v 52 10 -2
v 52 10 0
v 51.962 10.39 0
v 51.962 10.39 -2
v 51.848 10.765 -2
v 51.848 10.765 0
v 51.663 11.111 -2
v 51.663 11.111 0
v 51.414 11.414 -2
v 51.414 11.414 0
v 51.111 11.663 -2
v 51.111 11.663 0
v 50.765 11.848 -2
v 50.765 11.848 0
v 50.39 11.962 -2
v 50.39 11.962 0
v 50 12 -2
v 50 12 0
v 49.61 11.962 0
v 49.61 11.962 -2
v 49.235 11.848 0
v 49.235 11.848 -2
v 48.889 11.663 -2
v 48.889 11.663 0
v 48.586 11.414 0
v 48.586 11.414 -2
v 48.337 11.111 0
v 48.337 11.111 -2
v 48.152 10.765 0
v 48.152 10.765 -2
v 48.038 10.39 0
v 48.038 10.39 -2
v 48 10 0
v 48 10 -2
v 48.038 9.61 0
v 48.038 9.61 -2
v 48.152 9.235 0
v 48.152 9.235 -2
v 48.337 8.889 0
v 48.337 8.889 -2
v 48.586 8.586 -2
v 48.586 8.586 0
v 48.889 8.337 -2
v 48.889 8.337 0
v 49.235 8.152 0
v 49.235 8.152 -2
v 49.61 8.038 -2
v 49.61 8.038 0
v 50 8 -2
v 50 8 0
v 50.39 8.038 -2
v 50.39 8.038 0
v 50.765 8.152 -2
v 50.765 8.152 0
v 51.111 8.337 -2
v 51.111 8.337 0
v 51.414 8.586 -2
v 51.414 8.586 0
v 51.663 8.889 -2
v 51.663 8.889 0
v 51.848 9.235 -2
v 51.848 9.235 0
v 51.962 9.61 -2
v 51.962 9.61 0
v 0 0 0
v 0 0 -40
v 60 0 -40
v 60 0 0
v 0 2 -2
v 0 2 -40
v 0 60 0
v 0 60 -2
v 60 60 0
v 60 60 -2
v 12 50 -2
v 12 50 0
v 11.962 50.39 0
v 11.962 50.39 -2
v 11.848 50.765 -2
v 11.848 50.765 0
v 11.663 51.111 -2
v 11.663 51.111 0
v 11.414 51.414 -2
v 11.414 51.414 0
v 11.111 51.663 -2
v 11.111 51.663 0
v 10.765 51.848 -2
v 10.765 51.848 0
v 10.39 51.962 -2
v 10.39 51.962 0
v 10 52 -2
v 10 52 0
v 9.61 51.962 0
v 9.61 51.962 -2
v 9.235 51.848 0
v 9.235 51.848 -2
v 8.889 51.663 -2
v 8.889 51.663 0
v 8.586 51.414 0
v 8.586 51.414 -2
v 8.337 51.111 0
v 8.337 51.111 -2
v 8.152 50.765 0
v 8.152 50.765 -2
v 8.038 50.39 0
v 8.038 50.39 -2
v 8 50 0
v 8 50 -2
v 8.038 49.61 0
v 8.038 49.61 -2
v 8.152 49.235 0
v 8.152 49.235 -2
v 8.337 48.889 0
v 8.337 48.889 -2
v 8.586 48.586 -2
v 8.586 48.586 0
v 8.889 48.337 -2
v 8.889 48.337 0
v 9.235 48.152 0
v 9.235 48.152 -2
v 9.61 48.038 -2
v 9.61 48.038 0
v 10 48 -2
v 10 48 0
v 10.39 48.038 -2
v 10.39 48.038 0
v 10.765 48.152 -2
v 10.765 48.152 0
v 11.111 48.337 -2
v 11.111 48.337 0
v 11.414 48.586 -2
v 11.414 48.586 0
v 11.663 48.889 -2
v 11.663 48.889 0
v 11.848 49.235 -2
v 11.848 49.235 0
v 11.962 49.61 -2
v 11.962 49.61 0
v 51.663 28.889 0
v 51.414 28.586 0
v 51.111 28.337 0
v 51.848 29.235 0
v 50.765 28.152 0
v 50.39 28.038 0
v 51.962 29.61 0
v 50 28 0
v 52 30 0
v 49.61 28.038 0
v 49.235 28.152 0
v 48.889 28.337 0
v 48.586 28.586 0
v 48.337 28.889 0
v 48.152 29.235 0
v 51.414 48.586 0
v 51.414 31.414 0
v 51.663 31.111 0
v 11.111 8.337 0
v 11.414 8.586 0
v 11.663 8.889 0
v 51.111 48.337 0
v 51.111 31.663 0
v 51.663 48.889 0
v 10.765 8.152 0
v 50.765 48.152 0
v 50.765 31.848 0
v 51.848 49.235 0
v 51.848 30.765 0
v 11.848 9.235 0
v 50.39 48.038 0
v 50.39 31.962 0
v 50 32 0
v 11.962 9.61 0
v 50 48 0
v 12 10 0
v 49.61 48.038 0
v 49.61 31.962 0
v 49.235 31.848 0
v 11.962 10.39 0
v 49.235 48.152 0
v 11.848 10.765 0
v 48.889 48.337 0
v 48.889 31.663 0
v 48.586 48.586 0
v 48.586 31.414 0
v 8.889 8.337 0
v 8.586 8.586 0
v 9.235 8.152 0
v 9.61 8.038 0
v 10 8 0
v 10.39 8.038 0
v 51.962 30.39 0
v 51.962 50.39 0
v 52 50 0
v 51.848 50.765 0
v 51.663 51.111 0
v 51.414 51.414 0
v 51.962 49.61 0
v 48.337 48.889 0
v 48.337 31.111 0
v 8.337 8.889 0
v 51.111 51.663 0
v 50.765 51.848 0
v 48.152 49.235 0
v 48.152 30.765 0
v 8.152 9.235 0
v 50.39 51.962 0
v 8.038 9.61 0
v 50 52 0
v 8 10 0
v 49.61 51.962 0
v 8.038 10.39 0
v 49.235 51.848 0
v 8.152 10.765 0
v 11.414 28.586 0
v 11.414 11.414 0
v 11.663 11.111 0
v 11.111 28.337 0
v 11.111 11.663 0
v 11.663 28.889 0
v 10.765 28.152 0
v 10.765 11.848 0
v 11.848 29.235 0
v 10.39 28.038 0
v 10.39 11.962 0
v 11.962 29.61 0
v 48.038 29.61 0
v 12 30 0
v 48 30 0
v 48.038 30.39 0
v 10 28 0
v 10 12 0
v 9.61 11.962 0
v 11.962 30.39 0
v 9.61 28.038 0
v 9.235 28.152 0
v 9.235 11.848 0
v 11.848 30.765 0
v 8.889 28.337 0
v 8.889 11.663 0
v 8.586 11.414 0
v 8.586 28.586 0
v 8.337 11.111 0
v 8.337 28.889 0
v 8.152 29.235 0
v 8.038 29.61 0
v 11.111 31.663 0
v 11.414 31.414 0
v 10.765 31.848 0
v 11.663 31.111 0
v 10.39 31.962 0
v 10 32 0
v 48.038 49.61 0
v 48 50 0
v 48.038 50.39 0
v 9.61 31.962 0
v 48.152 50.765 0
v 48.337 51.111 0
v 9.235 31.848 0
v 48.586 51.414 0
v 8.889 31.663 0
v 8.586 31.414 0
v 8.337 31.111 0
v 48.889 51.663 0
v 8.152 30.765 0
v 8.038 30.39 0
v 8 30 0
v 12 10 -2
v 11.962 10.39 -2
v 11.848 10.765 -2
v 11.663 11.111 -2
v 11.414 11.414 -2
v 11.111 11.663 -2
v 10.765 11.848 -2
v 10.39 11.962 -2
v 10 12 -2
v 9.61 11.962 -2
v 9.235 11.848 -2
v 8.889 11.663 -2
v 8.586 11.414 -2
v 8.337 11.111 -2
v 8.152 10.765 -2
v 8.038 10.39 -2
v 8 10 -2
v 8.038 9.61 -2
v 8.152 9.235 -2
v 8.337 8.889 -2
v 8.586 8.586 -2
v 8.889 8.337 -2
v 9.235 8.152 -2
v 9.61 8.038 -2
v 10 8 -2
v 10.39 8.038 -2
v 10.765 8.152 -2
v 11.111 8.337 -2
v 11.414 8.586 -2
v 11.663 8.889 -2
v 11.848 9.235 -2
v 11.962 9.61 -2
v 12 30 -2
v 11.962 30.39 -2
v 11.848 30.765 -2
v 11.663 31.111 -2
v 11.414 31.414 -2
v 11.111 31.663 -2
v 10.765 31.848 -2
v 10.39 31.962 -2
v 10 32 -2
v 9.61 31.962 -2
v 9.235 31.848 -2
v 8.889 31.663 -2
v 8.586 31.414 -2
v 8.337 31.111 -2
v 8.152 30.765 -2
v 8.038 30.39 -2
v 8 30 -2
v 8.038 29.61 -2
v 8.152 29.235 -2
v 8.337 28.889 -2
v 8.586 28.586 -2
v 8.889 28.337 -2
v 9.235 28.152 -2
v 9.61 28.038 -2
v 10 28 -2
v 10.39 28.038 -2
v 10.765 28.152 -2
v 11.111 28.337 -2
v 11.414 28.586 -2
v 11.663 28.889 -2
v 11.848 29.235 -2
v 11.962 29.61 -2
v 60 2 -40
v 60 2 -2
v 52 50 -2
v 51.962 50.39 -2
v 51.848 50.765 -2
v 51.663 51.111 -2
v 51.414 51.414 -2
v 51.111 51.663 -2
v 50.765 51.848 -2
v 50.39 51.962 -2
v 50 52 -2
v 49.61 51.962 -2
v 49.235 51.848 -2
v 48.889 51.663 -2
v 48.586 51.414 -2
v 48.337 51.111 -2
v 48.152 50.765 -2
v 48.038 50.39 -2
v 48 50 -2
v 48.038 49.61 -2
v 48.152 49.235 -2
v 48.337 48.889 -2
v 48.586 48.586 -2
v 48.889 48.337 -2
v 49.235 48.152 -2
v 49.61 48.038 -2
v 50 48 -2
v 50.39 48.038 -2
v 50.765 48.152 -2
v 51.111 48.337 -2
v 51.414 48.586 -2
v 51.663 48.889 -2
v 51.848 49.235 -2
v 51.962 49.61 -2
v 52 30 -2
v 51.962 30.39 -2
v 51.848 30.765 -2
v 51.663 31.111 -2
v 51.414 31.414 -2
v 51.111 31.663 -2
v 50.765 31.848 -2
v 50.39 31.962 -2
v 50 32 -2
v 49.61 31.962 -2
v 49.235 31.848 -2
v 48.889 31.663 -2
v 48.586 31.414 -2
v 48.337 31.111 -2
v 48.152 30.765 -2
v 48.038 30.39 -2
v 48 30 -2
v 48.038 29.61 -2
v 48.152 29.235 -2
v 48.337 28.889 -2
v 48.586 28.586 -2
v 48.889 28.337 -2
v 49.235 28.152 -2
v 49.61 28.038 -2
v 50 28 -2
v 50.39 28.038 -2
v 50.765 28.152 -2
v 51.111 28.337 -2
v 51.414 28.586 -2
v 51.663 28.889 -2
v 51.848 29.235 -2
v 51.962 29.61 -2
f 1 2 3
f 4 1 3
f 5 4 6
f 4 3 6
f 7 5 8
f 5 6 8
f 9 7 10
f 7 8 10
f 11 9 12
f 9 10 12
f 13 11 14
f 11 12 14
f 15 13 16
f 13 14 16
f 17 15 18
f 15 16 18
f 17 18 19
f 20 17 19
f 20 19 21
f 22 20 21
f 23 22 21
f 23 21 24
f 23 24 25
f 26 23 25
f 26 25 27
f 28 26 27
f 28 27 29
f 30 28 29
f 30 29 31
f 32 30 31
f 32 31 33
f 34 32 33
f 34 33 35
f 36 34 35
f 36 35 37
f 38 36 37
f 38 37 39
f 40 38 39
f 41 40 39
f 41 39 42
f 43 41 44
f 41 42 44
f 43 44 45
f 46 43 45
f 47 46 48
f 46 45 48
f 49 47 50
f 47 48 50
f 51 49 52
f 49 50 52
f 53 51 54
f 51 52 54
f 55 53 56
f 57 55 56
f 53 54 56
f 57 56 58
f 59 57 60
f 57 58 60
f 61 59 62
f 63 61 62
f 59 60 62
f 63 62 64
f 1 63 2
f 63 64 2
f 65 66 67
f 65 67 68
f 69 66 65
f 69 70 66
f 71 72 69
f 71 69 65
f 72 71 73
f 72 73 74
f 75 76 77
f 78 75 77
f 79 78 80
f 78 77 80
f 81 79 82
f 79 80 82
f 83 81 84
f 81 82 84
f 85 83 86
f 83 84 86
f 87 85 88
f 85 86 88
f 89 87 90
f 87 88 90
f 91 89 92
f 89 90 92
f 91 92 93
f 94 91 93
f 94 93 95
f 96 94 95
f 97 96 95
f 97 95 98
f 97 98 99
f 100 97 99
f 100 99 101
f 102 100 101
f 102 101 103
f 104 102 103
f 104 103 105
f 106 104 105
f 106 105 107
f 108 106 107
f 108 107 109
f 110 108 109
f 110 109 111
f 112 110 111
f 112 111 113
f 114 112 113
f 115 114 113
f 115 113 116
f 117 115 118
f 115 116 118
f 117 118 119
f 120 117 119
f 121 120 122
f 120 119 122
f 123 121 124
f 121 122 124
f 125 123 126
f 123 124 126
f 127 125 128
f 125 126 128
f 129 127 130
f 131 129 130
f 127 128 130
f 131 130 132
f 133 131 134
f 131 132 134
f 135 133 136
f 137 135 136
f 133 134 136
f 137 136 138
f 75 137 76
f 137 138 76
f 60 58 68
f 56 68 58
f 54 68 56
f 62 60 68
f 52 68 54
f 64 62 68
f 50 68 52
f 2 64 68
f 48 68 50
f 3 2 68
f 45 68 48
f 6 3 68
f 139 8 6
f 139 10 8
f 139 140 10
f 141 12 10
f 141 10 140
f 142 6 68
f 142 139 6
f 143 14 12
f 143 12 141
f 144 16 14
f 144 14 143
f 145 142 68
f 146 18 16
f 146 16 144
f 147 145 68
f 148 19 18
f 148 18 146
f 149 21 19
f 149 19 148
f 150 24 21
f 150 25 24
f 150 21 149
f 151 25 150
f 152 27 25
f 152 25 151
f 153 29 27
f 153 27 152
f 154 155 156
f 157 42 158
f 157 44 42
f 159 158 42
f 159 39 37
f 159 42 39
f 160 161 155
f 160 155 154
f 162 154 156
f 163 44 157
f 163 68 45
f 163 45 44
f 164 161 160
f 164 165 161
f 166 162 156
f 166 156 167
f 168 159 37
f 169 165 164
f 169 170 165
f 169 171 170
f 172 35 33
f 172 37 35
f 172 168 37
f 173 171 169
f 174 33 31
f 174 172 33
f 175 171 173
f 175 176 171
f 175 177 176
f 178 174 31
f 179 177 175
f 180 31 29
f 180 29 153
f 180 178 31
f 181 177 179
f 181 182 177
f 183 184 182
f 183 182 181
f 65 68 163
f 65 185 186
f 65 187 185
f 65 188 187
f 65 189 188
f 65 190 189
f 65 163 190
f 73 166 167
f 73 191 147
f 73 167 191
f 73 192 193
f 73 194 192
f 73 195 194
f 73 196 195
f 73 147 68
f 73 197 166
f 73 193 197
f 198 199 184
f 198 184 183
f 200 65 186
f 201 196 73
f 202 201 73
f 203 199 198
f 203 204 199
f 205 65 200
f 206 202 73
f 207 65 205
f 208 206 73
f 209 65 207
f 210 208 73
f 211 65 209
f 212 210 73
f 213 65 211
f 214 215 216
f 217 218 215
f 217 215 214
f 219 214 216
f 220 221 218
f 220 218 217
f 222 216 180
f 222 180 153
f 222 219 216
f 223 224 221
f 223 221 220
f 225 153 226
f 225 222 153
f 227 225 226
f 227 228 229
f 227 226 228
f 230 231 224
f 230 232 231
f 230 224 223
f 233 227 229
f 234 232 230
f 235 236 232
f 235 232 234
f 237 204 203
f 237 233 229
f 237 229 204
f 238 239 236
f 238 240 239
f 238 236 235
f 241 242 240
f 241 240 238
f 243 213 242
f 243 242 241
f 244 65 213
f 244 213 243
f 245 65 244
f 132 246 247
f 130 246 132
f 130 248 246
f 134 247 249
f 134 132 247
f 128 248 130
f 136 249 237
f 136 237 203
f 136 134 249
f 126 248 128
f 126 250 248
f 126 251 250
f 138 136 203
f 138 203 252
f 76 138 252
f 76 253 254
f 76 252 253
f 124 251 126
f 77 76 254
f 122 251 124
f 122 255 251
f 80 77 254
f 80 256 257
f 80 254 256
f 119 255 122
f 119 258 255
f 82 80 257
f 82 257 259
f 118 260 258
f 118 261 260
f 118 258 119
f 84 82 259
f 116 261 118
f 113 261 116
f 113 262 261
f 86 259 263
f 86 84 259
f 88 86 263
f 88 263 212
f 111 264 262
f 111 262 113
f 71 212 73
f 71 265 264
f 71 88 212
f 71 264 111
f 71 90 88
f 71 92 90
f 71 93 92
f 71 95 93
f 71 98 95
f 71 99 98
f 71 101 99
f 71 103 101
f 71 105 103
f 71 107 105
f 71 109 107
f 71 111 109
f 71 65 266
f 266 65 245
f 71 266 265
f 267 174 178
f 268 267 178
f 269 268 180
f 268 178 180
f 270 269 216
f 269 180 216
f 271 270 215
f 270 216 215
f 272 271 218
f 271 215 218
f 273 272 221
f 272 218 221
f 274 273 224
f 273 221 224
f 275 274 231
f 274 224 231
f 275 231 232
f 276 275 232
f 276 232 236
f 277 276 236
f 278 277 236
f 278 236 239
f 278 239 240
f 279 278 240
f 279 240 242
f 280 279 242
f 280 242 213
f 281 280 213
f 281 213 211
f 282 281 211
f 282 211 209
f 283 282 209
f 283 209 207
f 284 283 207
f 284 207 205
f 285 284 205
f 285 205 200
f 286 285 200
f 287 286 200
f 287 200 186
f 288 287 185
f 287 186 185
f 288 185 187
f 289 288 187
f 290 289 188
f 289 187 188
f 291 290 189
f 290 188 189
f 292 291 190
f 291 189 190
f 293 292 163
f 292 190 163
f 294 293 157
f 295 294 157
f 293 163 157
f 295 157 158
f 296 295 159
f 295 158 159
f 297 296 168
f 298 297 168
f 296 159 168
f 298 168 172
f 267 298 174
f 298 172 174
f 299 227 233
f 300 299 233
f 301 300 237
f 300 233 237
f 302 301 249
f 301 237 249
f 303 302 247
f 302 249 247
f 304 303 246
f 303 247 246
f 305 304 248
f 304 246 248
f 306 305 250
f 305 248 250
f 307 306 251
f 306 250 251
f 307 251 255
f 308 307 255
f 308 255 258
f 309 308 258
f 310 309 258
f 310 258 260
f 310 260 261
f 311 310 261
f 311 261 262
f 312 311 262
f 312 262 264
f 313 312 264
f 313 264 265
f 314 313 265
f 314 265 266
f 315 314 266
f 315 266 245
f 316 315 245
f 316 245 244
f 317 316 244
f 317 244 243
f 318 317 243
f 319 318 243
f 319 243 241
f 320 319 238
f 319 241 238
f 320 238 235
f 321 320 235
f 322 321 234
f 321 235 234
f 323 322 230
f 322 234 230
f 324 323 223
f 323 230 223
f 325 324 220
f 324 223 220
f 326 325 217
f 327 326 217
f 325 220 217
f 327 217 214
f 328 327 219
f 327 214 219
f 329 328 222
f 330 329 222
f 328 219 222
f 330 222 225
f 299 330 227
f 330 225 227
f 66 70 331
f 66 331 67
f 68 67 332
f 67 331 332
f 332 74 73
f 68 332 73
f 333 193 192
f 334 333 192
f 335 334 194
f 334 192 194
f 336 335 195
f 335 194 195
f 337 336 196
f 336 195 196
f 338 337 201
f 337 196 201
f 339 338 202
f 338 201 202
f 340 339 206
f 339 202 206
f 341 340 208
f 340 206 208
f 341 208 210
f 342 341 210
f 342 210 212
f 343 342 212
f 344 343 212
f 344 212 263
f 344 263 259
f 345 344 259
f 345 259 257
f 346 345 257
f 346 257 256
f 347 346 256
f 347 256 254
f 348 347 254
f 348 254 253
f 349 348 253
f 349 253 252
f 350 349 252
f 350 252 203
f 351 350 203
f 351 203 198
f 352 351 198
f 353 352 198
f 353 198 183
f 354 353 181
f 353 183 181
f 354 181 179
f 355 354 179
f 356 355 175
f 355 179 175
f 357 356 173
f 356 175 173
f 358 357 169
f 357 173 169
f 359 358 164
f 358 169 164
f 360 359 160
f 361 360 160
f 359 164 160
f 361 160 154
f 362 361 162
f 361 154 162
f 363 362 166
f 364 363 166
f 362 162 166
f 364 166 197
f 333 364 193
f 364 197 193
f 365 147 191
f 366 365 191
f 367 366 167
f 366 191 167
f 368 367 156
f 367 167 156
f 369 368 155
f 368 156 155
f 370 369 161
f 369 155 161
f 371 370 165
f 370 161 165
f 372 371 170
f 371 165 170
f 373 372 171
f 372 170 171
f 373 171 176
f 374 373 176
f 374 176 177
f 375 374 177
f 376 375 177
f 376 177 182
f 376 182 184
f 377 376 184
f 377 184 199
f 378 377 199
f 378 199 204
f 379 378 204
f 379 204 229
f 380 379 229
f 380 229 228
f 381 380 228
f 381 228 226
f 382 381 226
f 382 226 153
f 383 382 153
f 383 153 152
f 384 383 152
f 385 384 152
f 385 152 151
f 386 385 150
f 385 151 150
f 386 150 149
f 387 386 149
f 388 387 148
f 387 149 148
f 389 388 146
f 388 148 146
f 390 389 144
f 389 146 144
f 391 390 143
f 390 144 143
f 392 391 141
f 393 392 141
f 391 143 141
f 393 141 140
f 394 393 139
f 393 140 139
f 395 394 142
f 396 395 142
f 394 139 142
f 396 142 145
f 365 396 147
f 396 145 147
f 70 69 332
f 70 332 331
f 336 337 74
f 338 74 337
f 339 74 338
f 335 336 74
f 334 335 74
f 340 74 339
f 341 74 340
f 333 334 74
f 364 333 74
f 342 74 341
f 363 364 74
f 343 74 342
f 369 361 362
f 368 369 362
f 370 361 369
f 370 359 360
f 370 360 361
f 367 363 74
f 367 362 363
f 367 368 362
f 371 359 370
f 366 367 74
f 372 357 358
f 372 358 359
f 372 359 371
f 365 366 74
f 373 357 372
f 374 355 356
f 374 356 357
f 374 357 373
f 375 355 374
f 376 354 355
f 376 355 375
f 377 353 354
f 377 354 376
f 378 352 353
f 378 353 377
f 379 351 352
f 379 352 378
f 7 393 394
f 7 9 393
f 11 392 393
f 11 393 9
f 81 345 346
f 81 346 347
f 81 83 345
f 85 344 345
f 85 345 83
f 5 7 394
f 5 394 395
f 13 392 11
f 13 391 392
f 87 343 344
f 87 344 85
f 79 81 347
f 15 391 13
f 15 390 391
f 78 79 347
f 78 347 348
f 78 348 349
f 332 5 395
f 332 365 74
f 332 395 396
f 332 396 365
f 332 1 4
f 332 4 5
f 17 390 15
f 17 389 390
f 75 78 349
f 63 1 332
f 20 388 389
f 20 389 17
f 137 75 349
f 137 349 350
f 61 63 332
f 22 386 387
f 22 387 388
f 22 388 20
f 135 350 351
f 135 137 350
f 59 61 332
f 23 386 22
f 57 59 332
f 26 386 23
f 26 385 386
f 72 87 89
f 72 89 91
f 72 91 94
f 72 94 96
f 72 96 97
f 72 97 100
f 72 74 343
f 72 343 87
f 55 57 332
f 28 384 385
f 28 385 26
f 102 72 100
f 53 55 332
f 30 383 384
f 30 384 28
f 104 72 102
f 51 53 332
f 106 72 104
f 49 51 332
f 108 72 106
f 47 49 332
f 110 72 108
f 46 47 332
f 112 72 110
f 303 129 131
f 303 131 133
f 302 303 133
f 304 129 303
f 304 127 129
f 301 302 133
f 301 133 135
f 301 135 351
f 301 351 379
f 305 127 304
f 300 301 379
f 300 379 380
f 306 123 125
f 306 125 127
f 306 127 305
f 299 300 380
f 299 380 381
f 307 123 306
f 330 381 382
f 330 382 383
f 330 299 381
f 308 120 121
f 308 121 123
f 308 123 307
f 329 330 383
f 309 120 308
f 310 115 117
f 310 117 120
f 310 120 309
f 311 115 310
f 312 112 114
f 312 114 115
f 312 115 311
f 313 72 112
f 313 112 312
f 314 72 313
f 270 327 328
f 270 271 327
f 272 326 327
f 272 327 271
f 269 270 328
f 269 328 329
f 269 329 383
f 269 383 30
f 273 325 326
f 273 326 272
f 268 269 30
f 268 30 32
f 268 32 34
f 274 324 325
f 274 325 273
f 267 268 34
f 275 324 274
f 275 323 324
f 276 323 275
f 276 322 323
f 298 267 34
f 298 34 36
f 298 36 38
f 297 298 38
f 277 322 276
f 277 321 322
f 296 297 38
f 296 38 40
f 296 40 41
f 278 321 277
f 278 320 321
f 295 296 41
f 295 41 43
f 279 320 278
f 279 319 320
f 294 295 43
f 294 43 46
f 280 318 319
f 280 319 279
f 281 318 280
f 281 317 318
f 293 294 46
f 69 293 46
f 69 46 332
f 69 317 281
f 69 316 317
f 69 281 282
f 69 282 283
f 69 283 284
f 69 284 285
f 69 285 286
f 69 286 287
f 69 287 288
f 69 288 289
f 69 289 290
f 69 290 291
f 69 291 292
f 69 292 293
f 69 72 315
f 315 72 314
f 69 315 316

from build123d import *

# Parameters (mm, degrees)
EXTRUDE_1_DEPTH     = 60
SKETCH_2_R          = 2
CUT_EXTRUDE_1_DEPTH = 41


with BuildPart() as part:
    # Эскиз1 → Вытянуть-Тонкостенный1 (new body)
    with BuildSketch(Plane(origin=(0, 0, 0), x_dir=(0, 0, -1), z_dir=(1, 0, 0))):
        Polygon((40, 0), (0, 0), (0, 60), (2, 60), (2, 2), (40, 2), align=None)
    extrude(amount=EXTRUDE_1_DEPTH)

    # Эскиз2 → Вырез-Вытянуть1 (cut, through all)
    with BuildSketch(Plane.XY):
        with Locations((10, 50)):
            Circle(SKETCH_2_R)
        with Locations((50, 50)):
            Circle(SKETCH_2_R)
        with Locations((50, 30)):
            Circle(SKETCH_2_R)
        with Locations((50, 10)):
            Circle(SKETCH_2_R)
        with Locations((10, 30)):
            Circle(SKETCH_2_R)
        with Locations((10, 10)):
            Circle(SKETCH_2_R)
    extrude(amount=-CUT_EXTRUDE_1_DEPTH, mode=Mode.SUBTRACT)


solid = part.part
